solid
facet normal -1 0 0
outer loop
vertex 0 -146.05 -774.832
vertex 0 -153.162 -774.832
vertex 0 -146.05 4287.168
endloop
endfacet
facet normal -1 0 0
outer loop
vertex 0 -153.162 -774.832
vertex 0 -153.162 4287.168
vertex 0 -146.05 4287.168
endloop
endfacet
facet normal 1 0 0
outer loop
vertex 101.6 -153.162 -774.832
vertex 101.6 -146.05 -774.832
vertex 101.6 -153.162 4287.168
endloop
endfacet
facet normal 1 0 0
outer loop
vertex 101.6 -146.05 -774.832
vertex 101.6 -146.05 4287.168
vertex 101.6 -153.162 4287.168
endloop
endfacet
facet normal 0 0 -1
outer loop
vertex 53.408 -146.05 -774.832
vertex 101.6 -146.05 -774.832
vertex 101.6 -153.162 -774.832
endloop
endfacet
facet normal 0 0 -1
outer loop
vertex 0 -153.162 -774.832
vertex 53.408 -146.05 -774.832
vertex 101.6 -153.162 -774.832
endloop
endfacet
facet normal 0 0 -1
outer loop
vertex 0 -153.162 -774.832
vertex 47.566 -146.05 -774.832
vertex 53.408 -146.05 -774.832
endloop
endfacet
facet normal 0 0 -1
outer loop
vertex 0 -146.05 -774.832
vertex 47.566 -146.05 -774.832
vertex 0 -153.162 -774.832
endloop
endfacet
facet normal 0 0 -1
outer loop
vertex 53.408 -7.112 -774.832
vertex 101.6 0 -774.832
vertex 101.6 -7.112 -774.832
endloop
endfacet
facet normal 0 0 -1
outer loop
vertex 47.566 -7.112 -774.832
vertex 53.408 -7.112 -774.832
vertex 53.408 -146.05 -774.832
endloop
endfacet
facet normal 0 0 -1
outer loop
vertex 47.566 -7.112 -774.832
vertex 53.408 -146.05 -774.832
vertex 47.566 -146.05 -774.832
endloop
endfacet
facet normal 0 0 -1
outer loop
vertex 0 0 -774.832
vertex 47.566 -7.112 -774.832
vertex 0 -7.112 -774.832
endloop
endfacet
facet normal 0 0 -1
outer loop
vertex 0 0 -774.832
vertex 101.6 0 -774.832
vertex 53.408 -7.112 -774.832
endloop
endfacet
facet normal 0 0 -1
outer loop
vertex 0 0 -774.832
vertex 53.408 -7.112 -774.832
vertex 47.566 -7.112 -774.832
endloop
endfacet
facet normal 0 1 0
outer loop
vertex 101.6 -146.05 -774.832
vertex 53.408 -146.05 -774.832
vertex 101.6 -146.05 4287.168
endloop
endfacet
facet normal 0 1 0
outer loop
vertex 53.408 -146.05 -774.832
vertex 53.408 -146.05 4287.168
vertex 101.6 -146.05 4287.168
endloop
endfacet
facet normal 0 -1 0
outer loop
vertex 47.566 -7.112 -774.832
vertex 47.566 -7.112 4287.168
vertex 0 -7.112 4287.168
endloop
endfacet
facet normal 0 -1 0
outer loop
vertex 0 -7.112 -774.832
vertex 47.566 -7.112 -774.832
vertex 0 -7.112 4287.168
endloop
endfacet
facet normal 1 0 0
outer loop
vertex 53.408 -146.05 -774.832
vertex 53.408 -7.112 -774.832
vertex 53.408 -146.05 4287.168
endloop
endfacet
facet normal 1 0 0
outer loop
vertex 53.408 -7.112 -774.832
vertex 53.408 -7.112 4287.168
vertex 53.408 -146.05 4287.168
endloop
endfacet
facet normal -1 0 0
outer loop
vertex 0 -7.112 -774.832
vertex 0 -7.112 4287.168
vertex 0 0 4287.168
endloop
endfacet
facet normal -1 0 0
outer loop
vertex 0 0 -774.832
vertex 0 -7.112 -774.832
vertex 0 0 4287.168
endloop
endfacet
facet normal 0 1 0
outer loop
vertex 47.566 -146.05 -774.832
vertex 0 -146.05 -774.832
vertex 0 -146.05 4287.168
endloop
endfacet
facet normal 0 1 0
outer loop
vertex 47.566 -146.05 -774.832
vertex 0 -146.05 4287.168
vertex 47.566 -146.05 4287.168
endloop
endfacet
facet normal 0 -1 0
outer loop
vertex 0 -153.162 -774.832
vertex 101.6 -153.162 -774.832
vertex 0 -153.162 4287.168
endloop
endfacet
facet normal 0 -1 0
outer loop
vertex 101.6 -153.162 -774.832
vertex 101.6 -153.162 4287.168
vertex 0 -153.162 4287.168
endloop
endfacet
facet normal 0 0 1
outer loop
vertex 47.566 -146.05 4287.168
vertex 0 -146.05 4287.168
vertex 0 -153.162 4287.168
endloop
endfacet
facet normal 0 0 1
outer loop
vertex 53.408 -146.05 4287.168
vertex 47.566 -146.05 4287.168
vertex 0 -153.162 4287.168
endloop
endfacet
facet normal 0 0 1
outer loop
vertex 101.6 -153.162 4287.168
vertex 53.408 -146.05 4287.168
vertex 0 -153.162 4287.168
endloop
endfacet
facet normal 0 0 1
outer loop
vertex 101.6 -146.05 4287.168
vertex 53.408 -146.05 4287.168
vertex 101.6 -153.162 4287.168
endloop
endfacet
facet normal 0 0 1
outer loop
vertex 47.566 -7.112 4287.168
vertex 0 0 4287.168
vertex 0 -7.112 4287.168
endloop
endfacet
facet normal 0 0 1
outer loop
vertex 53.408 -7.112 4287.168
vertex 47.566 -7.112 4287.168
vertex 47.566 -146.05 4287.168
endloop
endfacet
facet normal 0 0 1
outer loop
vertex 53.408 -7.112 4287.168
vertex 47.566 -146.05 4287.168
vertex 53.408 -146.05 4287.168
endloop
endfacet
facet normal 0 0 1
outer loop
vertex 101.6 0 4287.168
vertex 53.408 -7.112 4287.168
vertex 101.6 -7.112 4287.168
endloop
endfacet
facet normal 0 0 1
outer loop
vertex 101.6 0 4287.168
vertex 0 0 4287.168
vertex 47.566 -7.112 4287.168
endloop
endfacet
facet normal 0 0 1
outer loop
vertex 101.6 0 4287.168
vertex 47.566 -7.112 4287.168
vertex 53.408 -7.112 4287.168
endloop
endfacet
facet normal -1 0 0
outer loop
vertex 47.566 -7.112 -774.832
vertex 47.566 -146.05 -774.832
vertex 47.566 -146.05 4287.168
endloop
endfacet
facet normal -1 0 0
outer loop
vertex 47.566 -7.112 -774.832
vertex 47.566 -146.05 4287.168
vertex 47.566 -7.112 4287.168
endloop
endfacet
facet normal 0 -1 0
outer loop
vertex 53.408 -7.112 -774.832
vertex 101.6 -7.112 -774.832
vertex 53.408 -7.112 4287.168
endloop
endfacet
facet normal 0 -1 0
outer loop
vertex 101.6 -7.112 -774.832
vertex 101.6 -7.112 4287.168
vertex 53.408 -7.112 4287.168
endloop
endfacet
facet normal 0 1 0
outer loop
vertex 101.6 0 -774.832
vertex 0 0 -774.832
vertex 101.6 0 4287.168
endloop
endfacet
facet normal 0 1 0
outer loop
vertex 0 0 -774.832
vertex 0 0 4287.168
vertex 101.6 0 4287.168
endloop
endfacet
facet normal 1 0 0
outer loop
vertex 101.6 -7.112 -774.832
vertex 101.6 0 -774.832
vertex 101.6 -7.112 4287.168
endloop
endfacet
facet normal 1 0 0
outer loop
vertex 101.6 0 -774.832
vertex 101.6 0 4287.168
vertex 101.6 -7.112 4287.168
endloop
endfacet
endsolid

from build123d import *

# Parameters (mm, degrees)
BOSS_EXTRUDE1_DEPTH = 3510
BOSS_EXTRUDE2_DEPTH = 777.168091258
BOSS_EXTRUDE3_DEPTH = 774.831908742


with BuildPart() as part:
    # Sketch1 → Boss-Extrude1 (new body)
    with BuildSketch(Plane.XY):
        Polygon((0, -0.000240533), (101.6, -0.000240533), (101.6, -7.112240533), (53.408035714, -7.112240533), (53.408035714, -146.050240533), (101.6, -146.050240533), (101.6, -153.162240533), (0, -153.162240533), (0, -146.050240533), (47.566035714, -146.050240533), (47.566035714, -7.112240533), (0, -7.112240533), align=None)
    extrude(amount=BOSS_EXTRUDE1_DEPTH)

    # Sketch3 → Boss-Extrude2 (add)
    with BuildSketch(Plane.XY.offset(3510)):
        Polygon((0, -0.000240533), (0, -7.112240533), (47.566035714, -7.112240533), (47.566035714, -146.050240533), (0, -146.050240533), (0, -153.162240533), (101.6, -153.162240533), (101.6, -146.050240533), (53.408035714, -146.050240533), (53.408035714, -7.112240533), (101.6, -7.112240533), (101.6, -0.000240533), align=None)
    extrude(amount=BOSS_EXTRUDE2_DEPTH)

    # Sketch4 → Boss-Extrude3 (add)
    with BuildSketch(Plane(origin=(0, 0, 0), x_dir=(-1, 0, 0), z_dir=(0, 0, -1))):
        Polygon((0, -7.112240533), (0, -0.000240533), (-101.6, -0.000240533), (-101.6, -7.112240533), (-53.408035714, -7.112240533), (-53.408035714, -146.050240533), (-101.6, -146.050240533), (-101.6, -153.162240533), (0, -153.162240533), (0, -146.050240533), (-47.566035714, -146.050240533), (-47.566035714, -7.112240533), align=None)
    extrude(amount=BOSS_EXTRUDE3_DEPTH)


solid = part.part
